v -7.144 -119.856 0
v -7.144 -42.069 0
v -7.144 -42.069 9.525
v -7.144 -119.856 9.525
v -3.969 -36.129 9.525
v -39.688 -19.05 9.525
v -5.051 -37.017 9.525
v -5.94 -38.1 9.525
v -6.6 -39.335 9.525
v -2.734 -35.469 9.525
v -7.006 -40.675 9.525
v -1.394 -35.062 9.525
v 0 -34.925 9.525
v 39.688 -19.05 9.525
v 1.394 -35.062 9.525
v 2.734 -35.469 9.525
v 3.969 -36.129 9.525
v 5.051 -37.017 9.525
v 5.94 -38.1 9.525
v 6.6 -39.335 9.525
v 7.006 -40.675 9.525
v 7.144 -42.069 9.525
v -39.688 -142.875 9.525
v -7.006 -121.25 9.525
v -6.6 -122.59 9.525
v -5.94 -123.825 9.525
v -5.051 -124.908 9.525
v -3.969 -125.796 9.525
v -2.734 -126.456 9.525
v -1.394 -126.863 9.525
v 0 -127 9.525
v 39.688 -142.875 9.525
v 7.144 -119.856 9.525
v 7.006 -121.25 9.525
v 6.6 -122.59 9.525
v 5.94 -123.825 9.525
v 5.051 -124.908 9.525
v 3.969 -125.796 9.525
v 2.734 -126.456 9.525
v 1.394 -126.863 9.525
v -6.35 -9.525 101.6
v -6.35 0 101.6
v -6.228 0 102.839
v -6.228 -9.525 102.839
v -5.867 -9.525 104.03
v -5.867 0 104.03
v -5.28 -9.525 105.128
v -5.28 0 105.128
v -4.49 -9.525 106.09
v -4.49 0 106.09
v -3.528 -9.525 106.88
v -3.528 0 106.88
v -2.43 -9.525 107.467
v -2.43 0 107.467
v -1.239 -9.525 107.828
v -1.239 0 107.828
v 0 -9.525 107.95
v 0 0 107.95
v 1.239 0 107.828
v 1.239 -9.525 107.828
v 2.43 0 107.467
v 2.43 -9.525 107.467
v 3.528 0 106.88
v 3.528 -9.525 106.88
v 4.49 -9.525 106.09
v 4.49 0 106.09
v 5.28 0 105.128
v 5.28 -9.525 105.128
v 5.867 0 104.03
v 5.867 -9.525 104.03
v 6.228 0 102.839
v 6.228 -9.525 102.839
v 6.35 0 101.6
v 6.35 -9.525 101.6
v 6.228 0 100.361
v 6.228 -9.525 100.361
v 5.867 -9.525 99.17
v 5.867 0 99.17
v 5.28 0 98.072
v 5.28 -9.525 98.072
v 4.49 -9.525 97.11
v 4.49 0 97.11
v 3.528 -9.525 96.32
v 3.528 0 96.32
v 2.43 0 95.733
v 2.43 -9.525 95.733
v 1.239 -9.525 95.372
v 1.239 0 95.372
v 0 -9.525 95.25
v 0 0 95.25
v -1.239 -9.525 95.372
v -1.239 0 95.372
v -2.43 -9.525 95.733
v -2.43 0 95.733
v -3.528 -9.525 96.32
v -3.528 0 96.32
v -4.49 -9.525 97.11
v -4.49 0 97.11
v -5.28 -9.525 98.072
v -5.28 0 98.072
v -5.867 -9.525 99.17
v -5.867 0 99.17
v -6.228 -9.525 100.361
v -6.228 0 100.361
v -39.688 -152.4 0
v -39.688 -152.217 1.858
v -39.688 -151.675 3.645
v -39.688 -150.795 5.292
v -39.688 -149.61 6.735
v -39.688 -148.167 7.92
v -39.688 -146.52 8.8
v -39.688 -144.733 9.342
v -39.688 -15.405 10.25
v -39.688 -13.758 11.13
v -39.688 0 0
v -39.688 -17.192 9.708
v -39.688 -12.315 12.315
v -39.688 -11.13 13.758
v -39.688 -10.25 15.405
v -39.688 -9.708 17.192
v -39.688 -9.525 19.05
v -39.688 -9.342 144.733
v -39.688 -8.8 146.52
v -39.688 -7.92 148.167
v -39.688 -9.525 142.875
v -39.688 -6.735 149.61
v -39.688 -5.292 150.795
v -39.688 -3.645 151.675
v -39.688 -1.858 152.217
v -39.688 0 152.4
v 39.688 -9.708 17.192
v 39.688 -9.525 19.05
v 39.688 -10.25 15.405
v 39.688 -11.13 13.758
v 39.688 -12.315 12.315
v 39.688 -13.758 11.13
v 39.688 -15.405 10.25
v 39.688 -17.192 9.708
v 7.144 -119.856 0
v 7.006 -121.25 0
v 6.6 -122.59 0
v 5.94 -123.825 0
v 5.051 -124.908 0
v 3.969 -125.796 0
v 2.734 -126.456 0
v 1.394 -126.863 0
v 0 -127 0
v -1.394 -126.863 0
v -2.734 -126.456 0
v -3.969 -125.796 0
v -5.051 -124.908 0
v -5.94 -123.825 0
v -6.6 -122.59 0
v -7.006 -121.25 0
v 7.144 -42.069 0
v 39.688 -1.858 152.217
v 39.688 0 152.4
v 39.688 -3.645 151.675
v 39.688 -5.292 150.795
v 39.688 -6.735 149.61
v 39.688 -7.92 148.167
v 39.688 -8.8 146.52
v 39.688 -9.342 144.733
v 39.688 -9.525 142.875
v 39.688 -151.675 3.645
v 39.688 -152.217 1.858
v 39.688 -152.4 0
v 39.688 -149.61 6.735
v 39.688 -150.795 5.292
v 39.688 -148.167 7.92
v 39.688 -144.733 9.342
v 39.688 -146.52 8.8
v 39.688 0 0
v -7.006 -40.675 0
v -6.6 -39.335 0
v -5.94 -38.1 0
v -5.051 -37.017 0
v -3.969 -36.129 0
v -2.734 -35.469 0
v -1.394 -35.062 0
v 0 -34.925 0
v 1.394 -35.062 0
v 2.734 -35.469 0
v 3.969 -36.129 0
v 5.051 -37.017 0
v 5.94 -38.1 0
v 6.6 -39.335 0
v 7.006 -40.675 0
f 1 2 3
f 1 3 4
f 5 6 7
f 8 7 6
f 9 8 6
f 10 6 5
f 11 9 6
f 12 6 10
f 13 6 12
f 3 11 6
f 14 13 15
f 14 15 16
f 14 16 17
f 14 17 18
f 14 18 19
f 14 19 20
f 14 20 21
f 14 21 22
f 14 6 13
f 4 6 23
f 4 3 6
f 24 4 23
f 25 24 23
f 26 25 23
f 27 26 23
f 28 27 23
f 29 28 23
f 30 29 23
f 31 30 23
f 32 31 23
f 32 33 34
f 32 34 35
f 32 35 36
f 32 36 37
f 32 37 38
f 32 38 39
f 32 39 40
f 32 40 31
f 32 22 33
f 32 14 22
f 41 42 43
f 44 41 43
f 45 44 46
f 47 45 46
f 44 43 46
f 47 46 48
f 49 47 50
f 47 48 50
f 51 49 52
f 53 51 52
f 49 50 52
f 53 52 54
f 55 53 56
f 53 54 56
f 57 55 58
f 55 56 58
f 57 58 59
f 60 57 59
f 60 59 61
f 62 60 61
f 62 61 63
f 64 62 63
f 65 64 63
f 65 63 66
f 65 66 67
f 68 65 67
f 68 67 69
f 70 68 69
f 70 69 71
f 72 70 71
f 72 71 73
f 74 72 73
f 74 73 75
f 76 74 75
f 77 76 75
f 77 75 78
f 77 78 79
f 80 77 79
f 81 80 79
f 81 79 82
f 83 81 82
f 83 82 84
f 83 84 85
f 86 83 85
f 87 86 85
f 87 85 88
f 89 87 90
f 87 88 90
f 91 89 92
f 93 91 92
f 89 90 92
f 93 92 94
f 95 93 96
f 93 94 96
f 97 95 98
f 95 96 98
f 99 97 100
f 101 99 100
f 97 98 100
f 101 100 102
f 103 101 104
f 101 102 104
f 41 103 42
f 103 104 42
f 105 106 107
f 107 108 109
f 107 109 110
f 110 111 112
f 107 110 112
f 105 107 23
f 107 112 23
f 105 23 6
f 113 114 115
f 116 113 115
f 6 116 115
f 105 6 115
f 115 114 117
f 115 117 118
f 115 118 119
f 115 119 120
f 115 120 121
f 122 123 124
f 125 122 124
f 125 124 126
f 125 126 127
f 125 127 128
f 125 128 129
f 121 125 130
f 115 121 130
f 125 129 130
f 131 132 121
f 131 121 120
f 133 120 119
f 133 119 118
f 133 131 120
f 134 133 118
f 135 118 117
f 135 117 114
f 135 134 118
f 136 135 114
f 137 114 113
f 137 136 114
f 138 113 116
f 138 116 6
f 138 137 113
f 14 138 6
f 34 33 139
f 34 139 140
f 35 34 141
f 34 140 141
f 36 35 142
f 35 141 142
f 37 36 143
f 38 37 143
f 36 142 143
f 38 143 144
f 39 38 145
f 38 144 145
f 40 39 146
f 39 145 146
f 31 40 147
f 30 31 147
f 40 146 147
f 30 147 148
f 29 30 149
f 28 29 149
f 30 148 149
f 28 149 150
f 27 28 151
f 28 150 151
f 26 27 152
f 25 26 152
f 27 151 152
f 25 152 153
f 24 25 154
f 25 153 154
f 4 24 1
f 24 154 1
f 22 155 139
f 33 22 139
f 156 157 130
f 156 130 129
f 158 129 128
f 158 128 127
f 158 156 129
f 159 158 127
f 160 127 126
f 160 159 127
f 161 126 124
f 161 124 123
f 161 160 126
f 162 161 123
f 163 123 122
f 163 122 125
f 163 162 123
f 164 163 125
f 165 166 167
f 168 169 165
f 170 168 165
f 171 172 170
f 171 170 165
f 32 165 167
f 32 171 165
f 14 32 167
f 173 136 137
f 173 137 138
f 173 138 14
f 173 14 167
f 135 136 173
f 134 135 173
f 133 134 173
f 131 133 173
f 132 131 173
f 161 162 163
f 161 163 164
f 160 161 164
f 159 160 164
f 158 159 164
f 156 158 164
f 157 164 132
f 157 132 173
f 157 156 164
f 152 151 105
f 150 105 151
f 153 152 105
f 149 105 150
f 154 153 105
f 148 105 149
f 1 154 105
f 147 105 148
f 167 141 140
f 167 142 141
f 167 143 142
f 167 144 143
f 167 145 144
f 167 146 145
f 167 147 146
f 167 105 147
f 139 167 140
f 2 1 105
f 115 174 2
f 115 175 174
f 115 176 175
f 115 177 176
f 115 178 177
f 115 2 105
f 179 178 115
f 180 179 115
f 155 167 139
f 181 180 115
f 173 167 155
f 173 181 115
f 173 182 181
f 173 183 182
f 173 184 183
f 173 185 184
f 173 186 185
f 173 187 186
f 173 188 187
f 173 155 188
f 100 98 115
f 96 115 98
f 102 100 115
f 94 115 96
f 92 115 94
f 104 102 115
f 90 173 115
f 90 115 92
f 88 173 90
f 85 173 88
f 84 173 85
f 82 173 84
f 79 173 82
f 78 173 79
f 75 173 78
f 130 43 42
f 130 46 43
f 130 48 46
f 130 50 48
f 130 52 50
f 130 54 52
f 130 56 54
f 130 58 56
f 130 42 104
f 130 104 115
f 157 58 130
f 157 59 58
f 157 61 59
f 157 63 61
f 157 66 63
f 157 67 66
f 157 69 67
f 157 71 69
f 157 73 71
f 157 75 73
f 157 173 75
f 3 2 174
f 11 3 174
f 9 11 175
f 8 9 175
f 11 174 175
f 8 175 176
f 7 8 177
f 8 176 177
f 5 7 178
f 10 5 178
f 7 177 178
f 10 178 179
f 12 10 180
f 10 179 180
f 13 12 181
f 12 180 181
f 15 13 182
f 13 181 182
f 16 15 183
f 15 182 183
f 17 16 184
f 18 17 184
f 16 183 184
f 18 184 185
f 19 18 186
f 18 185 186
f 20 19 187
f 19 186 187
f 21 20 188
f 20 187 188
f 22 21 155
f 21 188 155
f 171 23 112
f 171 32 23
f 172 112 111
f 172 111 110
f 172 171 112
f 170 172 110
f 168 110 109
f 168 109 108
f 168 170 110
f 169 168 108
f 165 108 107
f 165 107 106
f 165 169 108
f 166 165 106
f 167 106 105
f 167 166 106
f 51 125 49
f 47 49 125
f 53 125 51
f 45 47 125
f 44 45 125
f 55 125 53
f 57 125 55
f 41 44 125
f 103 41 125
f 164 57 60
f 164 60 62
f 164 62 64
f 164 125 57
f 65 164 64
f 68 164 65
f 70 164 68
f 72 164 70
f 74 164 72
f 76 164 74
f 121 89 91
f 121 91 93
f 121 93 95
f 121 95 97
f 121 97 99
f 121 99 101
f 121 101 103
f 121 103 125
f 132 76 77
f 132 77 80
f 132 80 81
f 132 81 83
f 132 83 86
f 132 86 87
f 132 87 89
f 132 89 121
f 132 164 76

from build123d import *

# Parameters (mm, degrees)
F1_DEPTH = 39.6875
F2_R     = 6.35
F3_DEPTH = 25.4
F4_W     = 14.2875
F4_H     = 77.7875
F5_DEPTH = 25.4


with BuildPart() as f1:
    # F0 (on Right) → F1 (new body, symmetric)
    with BuildSketch(Plane.YZ):
        with BuildLine():
            Line((0, 0), (0, 152.4))
            ThreePointArc((0, 152.4), (-6.7351920908, 149.6101920908), (-9.525, 142.875))
            Line((-9.525, 142.875), (-9.525, 19.05))
            ThreePointArc((-9.525, 19.05), (-12.3148079092, 12.3148079092), (-19.05, 9.525))
            Line((-19.05, 9.525), (-142.875, 9.525))
            ThreePointArc((-142.875, 9.525), (-149.6101920908, 6.7351920908), (-152.4, 0))
            Line((-152.4, 0), (0, 0))
        make_face()
    extrude(amount=F1_DEPTH, both=True)

    # F2 (on face) → F3 (cut)
    with BuildSketch(Plane(origin=(0, 0, 0), x_dir=(-1, 0, 0), z_dir=(0, 1, 0))):
        with Locations((0, 101.6)):
            Circle(F2_R)
    extrude(amount=-F3_DEPTH, mode=Mode.SUBTRACT)

    # F4 (on face) → F5 (cut)
    with BuildSketch(Plane(origin=(0, 0, 0), x_dir=(1, 0, 0), z_dir=(0, 0, -1))):
        with Locations((0, 80.9625)):
            Rectangle(F4_W, F4_H)
        with BuildLine():
            Line((-7.14375, 119.85625), (7.14375, 119.85625))
            ThreePointArc((7.14375, 119.85625), (0, 127), (-7.14375, 119.85625))
        make_face()
        with BuildLine():
            ThreePointArc((-7.14375, 42.06875), (0, 34.925), (7.14375, 42.06875))
            Line((7.14375, 42.06875), (-7.14375, 42.06875))
        make_face()
    extrude(amount=-F5_DEPTH, mode=Mode.SUBTRACT)


solid = f1.part
